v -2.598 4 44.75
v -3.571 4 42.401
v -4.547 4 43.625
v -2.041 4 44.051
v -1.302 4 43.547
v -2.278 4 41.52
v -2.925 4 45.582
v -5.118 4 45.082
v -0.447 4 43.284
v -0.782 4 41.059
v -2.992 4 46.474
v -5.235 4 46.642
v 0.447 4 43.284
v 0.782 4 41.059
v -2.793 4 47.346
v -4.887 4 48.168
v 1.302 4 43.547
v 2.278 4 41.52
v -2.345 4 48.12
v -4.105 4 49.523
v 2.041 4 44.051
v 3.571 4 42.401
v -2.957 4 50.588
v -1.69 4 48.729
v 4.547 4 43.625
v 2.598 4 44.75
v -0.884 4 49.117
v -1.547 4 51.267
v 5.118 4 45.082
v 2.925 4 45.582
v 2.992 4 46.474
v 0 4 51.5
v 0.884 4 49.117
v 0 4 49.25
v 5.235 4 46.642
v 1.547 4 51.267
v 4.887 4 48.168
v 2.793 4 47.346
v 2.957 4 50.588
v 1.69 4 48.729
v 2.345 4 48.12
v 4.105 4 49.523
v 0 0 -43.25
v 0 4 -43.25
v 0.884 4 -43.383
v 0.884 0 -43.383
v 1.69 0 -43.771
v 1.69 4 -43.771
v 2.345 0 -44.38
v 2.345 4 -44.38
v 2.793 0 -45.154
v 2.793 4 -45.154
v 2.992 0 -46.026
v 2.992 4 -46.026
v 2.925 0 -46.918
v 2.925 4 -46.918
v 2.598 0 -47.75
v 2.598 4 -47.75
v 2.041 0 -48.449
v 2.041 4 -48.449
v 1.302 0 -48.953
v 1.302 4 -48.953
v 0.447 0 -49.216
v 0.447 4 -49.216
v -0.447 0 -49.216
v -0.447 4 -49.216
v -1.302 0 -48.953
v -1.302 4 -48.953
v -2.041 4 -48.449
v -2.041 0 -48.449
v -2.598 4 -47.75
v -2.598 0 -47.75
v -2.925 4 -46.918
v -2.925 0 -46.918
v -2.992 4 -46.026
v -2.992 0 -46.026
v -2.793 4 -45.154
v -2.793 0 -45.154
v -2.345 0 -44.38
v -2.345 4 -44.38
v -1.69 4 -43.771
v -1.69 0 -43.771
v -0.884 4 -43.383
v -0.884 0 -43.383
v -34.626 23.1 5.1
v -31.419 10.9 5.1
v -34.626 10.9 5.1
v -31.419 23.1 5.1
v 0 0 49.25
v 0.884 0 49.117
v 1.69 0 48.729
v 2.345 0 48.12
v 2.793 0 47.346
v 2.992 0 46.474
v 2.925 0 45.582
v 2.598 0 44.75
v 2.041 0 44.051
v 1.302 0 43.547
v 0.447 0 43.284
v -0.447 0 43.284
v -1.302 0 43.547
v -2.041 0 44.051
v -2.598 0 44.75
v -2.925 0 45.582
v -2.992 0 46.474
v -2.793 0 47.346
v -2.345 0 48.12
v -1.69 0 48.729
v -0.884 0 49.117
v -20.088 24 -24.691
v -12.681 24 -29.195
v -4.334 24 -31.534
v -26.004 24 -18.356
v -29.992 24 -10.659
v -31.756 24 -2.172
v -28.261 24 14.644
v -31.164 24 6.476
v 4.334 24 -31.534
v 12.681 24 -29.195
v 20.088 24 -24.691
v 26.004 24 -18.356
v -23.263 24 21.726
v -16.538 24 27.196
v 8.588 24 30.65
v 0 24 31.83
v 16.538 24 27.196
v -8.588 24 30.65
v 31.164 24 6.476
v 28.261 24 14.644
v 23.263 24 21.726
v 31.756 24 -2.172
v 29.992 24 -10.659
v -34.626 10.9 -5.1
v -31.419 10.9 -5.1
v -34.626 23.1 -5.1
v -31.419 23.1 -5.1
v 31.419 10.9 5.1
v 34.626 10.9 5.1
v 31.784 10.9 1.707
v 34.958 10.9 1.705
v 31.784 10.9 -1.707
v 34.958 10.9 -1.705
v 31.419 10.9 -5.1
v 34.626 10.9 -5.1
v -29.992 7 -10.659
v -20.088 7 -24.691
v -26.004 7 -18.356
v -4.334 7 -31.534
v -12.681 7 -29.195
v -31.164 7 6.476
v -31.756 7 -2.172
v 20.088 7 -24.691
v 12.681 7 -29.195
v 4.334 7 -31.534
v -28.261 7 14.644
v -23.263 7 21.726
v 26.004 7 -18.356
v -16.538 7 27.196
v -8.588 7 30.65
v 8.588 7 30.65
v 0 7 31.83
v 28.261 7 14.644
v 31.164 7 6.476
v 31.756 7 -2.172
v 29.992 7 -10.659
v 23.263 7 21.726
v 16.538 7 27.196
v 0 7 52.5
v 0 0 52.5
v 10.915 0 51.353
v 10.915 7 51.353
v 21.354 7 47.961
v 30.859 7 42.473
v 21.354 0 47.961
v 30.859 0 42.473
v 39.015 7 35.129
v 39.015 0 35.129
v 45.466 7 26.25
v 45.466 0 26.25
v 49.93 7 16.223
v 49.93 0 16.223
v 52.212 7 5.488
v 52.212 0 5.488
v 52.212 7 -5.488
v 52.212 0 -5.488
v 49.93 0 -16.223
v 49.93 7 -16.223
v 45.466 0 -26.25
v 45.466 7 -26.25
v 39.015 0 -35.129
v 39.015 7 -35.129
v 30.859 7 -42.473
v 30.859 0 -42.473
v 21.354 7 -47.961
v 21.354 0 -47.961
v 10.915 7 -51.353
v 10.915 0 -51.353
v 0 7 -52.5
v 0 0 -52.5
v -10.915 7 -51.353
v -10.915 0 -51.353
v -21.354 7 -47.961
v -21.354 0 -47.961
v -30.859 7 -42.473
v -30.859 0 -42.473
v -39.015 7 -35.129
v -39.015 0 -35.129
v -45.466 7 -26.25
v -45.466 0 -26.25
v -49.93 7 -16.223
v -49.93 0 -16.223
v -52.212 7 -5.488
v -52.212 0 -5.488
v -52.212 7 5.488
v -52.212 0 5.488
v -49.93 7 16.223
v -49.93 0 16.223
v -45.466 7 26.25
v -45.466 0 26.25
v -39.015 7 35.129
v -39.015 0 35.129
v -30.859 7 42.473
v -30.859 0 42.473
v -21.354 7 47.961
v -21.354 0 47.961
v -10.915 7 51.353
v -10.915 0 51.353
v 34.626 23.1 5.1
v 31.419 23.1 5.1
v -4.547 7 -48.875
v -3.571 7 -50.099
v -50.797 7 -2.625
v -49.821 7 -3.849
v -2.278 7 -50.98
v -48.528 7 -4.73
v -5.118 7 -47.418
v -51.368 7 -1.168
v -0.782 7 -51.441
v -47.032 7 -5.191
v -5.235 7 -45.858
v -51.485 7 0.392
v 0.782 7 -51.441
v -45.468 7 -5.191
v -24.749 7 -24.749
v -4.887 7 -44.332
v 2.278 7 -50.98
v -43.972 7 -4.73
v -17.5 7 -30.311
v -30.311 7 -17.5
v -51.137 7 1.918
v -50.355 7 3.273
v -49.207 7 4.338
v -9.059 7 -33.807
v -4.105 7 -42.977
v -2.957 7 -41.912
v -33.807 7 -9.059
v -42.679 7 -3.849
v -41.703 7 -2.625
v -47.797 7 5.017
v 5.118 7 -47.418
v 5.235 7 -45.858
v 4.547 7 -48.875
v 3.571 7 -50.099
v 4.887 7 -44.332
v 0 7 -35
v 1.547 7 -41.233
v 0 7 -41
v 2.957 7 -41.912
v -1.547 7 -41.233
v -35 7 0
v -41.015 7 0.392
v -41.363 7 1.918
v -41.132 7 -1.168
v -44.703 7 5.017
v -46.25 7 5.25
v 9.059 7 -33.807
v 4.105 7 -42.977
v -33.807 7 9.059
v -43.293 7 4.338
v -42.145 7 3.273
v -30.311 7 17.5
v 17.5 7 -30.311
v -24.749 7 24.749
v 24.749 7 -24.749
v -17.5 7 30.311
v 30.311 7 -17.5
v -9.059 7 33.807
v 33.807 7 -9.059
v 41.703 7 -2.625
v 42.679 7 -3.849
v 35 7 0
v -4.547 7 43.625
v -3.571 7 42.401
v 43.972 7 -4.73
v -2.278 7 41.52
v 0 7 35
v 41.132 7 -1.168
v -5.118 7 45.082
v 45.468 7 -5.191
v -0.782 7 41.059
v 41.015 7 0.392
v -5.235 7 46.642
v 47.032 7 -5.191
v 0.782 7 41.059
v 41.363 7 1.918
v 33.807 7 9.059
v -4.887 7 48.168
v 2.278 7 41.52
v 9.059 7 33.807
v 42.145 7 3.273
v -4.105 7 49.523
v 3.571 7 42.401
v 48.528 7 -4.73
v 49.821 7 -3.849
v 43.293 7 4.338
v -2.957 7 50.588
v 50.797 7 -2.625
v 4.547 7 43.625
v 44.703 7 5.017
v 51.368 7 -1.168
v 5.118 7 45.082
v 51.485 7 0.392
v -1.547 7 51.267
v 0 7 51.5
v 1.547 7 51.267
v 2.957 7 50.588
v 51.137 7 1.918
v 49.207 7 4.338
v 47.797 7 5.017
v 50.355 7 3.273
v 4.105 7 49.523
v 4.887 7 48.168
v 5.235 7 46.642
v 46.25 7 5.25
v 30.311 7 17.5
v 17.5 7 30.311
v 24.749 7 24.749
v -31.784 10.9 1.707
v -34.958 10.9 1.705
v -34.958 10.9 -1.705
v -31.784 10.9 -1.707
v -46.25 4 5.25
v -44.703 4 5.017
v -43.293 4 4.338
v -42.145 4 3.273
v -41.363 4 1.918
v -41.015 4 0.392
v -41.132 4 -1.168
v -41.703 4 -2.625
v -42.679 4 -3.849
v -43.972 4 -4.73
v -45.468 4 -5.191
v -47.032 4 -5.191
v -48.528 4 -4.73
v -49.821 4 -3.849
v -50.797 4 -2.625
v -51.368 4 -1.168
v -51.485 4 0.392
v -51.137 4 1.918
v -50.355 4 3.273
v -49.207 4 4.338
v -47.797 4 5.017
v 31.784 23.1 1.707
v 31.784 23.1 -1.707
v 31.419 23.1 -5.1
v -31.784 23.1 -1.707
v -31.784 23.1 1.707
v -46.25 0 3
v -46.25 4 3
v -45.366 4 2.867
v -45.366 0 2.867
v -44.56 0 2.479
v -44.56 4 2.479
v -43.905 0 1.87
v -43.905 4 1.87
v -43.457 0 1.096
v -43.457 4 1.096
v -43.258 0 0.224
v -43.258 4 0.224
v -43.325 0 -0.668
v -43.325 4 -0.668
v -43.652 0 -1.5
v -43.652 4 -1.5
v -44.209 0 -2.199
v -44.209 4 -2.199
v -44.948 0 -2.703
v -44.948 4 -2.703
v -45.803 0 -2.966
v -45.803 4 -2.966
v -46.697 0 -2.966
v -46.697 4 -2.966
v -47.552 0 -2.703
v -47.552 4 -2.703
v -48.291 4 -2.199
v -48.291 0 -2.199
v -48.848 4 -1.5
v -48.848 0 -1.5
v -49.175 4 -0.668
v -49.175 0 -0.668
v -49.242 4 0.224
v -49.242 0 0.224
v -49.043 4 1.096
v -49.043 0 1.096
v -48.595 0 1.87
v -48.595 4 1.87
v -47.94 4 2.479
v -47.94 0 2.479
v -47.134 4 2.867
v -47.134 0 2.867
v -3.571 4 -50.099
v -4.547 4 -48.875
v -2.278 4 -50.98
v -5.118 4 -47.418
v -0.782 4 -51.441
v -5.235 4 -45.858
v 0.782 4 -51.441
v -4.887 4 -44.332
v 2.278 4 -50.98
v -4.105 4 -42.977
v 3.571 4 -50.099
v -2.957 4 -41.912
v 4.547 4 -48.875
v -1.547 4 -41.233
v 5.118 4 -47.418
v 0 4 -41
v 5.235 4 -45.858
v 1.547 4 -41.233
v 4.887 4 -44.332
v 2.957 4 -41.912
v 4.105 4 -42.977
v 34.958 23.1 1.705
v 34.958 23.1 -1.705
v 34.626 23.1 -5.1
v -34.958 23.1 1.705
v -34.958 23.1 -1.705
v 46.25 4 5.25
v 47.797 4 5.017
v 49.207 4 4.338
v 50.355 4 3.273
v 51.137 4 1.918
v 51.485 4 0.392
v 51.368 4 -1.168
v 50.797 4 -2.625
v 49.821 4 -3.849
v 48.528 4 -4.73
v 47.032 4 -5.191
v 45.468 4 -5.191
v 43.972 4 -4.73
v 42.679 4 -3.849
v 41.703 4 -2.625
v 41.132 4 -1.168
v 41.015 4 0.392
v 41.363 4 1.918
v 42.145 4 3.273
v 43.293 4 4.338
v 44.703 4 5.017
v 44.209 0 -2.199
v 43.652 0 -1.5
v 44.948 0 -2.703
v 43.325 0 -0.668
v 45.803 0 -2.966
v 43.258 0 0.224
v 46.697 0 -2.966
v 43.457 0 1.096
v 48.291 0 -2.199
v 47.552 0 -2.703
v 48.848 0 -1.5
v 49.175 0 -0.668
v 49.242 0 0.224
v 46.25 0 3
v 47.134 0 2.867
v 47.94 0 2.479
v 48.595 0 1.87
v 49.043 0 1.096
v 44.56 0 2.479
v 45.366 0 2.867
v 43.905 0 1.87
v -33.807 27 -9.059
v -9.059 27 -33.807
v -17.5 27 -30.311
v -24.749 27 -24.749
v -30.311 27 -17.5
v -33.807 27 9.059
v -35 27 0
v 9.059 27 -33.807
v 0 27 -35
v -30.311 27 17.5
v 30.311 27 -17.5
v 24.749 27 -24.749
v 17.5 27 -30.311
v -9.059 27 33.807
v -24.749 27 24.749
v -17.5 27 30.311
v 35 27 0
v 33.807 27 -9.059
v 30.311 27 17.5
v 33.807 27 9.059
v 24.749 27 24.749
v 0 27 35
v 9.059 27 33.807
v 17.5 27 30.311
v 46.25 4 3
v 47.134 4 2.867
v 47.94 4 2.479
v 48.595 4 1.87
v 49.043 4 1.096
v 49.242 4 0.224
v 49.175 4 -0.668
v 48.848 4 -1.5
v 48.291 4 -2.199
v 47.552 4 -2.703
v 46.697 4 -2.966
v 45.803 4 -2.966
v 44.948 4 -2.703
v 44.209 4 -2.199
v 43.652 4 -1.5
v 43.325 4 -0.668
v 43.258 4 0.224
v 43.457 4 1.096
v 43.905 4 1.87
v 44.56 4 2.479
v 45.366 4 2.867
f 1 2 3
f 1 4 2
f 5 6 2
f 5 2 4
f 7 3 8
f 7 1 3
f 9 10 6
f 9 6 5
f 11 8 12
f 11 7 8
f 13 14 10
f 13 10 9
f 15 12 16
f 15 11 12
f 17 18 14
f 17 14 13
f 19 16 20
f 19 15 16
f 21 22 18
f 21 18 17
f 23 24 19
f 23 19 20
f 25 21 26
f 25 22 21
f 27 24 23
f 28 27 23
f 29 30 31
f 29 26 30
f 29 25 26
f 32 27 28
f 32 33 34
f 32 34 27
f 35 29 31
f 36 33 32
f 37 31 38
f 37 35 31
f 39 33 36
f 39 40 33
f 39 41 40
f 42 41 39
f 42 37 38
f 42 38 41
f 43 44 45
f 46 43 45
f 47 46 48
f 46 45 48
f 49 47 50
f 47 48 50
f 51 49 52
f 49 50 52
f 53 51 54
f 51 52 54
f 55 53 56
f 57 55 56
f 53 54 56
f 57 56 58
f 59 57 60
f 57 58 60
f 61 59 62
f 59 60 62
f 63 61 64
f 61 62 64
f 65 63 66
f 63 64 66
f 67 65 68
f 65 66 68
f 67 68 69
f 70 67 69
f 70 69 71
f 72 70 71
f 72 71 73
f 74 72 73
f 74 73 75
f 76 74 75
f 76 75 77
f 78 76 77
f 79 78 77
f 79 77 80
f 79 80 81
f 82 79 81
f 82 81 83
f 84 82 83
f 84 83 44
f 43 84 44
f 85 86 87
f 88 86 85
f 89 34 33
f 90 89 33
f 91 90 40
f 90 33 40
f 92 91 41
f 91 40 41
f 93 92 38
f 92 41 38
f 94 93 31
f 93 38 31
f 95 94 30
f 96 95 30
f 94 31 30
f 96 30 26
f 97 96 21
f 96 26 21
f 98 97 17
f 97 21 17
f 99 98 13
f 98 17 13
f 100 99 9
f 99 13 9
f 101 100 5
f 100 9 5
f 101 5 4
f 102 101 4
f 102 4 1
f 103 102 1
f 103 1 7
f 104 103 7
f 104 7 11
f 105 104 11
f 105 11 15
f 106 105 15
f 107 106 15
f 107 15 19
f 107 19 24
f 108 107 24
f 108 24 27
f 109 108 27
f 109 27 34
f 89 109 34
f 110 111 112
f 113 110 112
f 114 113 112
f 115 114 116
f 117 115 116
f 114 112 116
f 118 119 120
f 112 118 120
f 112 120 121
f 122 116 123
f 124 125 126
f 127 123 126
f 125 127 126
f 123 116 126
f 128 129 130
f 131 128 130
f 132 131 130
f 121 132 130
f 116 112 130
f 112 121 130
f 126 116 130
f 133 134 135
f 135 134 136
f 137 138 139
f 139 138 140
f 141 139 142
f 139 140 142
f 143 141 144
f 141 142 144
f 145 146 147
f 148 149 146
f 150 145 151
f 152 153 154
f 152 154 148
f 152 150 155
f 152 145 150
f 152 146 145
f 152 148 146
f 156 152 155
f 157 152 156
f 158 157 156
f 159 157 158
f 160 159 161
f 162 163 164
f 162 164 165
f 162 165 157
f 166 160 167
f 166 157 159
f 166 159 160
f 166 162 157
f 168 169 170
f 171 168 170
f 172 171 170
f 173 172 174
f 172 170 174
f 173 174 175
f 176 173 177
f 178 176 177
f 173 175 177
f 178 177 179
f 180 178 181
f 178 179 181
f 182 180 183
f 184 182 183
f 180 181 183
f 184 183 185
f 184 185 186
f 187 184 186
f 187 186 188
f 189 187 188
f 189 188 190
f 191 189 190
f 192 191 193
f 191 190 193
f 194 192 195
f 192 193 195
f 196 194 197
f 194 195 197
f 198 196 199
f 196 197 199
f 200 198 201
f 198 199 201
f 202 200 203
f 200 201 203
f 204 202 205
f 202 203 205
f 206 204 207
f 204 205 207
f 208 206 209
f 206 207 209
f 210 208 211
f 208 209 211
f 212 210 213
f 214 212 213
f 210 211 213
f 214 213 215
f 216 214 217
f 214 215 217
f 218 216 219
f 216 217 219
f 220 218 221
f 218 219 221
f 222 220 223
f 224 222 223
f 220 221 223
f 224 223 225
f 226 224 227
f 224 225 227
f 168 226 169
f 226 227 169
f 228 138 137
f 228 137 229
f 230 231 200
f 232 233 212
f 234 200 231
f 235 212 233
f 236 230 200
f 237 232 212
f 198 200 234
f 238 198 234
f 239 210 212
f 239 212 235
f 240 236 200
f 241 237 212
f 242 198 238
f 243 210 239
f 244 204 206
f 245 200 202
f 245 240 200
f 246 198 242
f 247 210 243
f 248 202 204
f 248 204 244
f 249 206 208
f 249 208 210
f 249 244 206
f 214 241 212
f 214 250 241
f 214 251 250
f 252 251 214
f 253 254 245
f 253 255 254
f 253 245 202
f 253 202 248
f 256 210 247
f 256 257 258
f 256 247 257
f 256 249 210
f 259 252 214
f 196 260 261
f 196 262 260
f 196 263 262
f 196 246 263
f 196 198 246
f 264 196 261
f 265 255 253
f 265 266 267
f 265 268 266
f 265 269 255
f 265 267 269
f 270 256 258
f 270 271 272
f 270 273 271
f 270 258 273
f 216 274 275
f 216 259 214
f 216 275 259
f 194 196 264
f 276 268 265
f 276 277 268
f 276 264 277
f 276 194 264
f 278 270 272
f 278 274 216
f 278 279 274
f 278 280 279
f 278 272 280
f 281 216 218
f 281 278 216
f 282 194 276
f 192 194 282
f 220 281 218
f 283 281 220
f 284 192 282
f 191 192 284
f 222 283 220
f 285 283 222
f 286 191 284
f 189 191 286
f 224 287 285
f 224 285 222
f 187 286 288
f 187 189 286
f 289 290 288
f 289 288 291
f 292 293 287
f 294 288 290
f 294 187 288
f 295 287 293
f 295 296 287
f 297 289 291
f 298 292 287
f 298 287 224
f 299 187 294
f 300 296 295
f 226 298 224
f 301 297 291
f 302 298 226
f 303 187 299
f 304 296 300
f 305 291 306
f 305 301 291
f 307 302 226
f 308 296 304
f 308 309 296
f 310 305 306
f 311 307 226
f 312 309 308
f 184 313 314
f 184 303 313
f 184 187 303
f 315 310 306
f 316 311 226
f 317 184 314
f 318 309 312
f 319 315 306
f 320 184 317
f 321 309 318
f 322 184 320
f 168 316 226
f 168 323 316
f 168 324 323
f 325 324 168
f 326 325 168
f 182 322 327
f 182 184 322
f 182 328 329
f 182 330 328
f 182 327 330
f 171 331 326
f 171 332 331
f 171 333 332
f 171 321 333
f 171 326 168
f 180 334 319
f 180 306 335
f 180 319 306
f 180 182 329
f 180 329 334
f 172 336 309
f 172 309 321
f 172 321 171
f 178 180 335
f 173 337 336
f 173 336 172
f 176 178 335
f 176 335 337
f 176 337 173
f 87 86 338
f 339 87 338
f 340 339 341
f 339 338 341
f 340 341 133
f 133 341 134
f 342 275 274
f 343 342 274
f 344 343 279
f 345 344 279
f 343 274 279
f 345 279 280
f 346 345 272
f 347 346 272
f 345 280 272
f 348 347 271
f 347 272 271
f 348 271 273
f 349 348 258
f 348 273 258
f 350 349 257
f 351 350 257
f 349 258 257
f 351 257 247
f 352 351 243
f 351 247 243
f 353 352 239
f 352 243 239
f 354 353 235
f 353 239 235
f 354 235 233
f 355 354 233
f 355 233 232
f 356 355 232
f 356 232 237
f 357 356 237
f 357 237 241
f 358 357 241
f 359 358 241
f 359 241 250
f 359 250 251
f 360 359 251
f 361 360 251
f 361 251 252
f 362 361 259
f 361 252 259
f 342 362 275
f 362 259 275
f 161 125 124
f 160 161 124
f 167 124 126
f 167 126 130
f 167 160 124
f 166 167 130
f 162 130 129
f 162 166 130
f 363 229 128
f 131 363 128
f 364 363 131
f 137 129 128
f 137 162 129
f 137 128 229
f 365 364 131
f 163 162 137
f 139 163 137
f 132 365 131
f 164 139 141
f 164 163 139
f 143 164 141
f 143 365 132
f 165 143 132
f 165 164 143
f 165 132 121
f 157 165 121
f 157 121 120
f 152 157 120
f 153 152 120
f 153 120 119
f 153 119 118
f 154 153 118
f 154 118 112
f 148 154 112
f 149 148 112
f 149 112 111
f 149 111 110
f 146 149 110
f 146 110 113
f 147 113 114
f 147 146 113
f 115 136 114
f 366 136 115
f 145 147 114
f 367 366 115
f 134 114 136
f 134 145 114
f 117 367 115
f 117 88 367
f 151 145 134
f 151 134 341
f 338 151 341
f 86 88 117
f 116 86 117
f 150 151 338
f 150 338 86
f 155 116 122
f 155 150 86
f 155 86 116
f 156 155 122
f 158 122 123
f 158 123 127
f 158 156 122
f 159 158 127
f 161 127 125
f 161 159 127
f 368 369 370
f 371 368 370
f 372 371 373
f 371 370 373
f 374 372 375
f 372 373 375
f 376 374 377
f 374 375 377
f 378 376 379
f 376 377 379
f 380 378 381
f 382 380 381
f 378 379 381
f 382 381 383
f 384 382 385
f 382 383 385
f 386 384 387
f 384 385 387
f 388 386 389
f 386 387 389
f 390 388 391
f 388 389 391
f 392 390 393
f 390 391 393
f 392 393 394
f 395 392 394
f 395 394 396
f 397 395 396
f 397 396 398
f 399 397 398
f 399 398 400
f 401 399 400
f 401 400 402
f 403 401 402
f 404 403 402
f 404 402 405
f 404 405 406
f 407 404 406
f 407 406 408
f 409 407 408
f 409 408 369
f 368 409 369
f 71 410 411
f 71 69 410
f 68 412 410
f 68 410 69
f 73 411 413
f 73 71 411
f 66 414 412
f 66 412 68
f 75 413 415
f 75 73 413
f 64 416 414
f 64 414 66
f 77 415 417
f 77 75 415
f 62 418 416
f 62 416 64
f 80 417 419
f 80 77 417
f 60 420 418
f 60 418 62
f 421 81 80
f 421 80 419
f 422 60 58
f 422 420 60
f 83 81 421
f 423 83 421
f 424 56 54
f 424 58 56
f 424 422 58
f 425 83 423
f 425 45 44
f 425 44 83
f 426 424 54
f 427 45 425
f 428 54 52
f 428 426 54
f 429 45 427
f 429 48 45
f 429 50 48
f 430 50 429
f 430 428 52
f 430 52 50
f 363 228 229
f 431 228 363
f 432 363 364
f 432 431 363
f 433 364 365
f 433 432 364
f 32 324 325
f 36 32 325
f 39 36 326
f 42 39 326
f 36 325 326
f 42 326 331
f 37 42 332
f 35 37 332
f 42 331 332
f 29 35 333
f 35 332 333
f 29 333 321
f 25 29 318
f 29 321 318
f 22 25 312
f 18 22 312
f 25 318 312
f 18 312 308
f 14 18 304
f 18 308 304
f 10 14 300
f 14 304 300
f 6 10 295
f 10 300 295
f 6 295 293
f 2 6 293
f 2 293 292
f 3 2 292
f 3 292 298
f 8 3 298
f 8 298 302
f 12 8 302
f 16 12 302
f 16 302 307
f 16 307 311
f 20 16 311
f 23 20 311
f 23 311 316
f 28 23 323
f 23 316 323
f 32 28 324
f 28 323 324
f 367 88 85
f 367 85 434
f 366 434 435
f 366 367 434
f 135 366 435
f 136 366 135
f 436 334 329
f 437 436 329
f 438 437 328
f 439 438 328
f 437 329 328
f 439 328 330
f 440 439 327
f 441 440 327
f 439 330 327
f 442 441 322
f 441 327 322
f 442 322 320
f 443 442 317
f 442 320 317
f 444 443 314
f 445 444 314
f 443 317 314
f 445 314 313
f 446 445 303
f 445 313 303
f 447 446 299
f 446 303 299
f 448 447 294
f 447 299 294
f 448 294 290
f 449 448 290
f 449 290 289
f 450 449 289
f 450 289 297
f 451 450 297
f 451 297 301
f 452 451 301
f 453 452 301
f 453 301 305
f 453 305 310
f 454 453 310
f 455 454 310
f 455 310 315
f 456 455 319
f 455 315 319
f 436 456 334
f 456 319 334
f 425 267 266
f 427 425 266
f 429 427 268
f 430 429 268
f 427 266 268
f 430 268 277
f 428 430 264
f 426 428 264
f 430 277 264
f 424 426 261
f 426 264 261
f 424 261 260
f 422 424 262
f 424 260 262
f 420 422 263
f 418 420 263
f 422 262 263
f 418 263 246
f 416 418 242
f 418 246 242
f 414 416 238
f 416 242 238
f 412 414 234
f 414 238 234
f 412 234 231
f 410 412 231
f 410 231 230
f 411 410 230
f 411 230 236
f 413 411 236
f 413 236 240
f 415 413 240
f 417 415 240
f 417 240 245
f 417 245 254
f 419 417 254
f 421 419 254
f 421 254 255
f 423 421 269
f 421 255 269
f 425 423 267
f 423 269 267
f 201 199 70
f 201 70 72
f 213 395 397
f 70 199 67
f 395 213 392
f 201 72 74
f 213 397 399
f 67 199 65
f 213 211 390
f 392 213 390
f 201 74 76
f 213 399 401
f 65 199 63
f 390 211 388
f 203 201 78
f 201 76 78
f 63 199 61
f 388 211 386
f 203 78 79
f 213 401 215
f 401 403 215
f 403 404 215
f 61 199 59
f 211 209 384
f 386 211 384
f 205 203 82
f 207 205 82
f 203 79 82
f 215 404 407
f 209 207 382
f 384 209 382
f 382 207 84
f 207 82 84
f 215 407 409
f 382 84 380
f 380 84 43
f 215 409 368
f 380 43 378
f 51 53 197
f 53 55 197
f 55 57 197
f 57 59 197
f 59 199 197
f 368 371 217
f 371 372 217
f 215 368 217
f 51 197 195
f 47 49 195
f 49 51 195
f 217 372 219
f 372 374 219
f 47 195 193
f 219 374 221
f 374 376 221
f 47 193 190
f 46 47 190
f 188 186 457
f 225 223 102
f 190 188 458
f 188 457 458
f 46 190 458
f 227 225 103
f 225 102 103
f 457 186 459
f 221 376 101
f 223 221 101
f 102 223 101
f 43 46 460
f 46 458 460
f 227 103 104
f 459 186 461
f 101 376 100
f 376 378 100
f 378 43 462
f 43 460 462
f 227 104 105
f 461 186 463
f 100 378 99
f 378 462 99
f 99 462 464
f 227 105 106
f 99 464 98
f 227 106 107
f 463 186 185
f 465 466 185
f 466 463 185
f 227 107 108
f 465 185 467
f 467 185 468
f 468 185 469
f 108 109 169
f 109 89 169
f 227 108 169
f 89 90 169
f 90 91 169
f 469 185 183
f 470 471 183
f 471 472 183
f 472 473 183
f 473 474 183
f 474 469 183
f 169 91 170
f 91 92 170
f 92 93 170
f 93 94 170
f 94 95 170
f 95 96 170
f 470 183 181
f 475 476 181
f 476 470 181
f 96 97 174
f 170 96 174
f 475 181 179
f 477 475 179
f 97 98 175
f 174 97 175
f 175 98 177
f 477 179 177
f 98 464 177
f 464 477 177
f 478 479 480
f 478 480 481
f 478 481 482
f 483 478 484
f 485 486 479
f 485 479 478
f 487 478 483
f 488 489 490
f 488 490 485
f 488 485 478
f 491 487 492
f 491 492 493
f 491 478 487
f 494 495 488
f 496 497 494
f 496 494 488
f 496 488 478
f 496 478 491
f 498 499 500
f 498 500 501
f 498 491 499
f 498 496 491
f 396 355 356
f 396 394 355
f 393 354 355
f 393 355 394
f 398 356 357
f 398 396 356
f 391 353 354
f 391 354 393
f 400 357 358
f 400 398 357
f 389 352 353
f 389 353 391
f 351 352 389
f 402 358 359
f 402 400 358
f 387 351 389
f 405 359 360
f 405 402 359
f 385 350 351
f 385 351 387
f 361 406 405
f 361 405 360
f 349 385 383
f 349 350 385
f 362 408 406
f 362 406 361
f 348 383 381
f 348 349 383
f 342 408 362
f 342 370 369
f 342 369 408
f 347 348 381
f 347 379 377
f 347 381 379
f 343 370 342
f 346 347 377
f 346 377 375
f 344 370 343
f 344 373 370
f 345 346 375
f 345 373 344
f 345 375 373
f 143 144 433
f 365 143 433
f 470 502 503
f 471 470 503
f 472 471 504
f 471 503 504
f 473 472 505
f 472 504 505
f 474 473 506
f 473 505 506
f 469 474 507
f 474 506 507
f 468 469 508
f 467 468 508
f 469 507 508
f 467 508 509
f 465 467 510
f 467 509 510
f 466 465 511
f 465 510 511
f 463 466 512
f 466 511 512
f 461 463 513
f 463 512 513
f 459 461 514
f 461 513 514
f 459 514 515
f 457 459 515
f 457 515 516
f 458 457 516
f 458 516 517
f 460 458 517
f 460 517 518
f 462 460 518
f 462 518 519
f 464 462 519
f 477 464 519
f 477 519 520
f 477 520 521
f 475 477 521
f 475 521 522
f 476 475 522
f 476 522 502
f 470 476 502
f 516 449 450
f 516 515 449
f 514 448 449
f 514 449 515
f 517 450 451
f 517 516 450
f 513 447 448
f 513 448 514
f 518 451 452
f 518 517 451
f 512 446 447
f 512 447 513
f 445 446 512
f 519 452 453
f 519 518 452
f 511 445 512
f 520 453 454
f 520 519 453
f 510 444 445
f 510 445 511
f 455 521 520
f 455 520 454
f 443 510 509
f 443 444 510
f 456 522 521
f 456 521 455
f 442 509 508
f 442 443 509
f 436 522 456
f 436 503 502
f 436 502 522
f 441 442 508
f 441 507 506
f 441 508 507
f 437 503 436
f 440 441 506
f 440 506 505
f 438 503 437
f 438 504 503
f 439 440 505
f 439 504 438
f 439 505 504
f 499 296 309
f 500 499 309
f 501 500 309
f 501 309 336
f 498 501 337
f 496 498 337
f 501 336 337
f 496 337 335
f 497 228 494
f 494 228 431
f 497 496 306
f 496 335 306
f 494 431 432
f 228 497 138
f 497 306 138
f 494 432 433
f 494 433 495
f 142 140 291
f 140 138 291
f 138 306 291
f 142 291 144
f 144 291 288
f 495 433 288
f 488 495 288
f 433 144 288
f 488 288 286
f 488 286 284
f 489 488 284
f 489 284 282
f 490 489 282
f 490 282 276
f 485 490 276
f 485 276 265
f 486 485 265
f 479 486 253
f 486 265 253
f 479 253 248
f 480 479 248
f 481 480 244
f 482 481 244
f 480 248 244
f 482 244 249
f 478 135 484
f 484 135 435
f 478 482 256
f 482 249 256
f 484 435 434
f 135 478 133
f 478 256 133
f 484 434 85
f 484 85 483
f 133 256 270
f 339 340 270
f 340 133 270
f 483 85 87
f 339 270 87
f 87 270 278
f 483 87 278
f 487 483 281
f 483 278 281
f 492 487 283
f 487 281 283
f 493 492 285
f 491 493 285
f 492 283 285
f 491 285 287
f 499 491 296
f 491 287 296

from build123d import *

# Parameters (mm, degrees)
SKETCH1_R           = 52.5
BOSS_EXTRUDE1_DEPTH = 7
SKETCH2_R           = 35
SKETCH2_R_2         = 31.83
BOSS_EXTRUDE3_DEPTH = 20
SKETCH3_R           = 3
CUT_EXTRUDE1_DEPTH  = 20
SKETCH4_R           = 5.25
CUT_EXTRUDE2_DEPTH  = 3
SKETCH5_W           = 10.2
SKETCH5_H           = 12.2
CUT_EXTRUDE3_DEPTH  = 120
BOSS_EXTRUDE4_START = -3
SKETCH6_R           = 31.83
BOSS_EXTRUDE4_DEPTH = 3


with BuildPart() as part:
    # Sketch1 → Boss-Extrude1 (new body)
    with BuildSketch(Plane(origin=(0, 0, 0), x_dir=(1, 0, 0), z_dir=(0, 1, 0))):
        with Locations(Location((0, 0, 0), (0, 0, 270))):
            Circle(SKETCH1_R)
    extrude(amount=BOSS_EXTRUDE1_DEPTH)

    # Sketch2 → Boss-Extrude3 (add)
    with BuildSketch(Plane(origin=(0, 7, 0), x_dir=(1, 0, 0), z_dir=(0, 1, 0))):
        with Locations(Location((0, 0, 0), (0, 0, 270))):
            Circle(SKETCH2_R)
        with Locations(Location((0, 0, 0), (0, 0, 270))):
            Circle(SKETCH2_R_2, mode=Mode.SUBTRACT)
    extrude(amount=BOSS_EXTRUDE3_DEPTH)

    # Sketch3 → Cut-Extrude1 (cut)
    with BuildSketch(Plane(origin=(0, 7, 0), x_dir=(1, 0, 0), z_dir=(0, 1, 0))):
        with Locations(Location((0, 46.25, 0), (0, 0, 270))):
            Circle(SKETCH3_R)
        with Locations(Location((46.25, 0, 0), (0, 0, 270))):
            Circle(SKETCH3_R)
        with Locations(Location((0, -46.25, 0), (0, 0, 270))):
            Circle(SKETCH3_R)
        with Locations(Location((-46.25, 0, 0), (0, 0, 270))):
            Circle(SKETCH3_R)
    extrude(amount=-CUT_EXTRUDE1_DEPTH, mode=Mode.SUBTRACT)

    # Sketch4 → Cut-Extrude2 (cut)
    with BuildSketch(Plane(origin=(0, 7, 0), x_dir=(1, 0, 0), z_dir=(0, 1, 0))):
        with Locations(Location((0, 46.25, 0), (0, 0, 270))):
            Circle(SKETCH4_R)
        with Locations(Location((46.25, 0, 0), (0, 0, 270))):
            Circle(SKETCH4_R)
        with Locations(Location((0, -46.25, 0), (0, 0, 270))):
            Circle(SKETCH4_R)
        with Locations(Location((-46.25, 0, 0), (0, 0, 270))):
            Circle(SKETCH4_R)
    extrude(amount=-CUT_EXTRUDE2_DEPTH, mode=Mode.SUBTRACT)

    # Sketch5 → Cut-Extrude3 (cut)
    with BuildSketch(Plane(origin=(60, 0, 0), x_dir=(0, 0, -1), z_dir=(1, 0, 0))):
        with Locations((0, 17)):
            Rectangle(SKETCH5_W, SKETCH5_H)
    extrude(amount=-CUT_EXTRUDE3_DEPTH, mode=Mode.SUBTRACT)

    # Sketch6 → Boss-Extrude4 (add)
    with BuildSketch(Plane(origin=(0, 27, 0), x_dir=(1, 0, 0), z_dir=(0, 1, 0)).offset(BOSS_EXTRUDE4_START)):
        with Locations(Location((0, 0, 0), (0, 0, 270))):
            Circle(SKETCH6_R)
    extrude(amount=BOSS_EXTRUDE4_DEPTH)


solid = part.part
